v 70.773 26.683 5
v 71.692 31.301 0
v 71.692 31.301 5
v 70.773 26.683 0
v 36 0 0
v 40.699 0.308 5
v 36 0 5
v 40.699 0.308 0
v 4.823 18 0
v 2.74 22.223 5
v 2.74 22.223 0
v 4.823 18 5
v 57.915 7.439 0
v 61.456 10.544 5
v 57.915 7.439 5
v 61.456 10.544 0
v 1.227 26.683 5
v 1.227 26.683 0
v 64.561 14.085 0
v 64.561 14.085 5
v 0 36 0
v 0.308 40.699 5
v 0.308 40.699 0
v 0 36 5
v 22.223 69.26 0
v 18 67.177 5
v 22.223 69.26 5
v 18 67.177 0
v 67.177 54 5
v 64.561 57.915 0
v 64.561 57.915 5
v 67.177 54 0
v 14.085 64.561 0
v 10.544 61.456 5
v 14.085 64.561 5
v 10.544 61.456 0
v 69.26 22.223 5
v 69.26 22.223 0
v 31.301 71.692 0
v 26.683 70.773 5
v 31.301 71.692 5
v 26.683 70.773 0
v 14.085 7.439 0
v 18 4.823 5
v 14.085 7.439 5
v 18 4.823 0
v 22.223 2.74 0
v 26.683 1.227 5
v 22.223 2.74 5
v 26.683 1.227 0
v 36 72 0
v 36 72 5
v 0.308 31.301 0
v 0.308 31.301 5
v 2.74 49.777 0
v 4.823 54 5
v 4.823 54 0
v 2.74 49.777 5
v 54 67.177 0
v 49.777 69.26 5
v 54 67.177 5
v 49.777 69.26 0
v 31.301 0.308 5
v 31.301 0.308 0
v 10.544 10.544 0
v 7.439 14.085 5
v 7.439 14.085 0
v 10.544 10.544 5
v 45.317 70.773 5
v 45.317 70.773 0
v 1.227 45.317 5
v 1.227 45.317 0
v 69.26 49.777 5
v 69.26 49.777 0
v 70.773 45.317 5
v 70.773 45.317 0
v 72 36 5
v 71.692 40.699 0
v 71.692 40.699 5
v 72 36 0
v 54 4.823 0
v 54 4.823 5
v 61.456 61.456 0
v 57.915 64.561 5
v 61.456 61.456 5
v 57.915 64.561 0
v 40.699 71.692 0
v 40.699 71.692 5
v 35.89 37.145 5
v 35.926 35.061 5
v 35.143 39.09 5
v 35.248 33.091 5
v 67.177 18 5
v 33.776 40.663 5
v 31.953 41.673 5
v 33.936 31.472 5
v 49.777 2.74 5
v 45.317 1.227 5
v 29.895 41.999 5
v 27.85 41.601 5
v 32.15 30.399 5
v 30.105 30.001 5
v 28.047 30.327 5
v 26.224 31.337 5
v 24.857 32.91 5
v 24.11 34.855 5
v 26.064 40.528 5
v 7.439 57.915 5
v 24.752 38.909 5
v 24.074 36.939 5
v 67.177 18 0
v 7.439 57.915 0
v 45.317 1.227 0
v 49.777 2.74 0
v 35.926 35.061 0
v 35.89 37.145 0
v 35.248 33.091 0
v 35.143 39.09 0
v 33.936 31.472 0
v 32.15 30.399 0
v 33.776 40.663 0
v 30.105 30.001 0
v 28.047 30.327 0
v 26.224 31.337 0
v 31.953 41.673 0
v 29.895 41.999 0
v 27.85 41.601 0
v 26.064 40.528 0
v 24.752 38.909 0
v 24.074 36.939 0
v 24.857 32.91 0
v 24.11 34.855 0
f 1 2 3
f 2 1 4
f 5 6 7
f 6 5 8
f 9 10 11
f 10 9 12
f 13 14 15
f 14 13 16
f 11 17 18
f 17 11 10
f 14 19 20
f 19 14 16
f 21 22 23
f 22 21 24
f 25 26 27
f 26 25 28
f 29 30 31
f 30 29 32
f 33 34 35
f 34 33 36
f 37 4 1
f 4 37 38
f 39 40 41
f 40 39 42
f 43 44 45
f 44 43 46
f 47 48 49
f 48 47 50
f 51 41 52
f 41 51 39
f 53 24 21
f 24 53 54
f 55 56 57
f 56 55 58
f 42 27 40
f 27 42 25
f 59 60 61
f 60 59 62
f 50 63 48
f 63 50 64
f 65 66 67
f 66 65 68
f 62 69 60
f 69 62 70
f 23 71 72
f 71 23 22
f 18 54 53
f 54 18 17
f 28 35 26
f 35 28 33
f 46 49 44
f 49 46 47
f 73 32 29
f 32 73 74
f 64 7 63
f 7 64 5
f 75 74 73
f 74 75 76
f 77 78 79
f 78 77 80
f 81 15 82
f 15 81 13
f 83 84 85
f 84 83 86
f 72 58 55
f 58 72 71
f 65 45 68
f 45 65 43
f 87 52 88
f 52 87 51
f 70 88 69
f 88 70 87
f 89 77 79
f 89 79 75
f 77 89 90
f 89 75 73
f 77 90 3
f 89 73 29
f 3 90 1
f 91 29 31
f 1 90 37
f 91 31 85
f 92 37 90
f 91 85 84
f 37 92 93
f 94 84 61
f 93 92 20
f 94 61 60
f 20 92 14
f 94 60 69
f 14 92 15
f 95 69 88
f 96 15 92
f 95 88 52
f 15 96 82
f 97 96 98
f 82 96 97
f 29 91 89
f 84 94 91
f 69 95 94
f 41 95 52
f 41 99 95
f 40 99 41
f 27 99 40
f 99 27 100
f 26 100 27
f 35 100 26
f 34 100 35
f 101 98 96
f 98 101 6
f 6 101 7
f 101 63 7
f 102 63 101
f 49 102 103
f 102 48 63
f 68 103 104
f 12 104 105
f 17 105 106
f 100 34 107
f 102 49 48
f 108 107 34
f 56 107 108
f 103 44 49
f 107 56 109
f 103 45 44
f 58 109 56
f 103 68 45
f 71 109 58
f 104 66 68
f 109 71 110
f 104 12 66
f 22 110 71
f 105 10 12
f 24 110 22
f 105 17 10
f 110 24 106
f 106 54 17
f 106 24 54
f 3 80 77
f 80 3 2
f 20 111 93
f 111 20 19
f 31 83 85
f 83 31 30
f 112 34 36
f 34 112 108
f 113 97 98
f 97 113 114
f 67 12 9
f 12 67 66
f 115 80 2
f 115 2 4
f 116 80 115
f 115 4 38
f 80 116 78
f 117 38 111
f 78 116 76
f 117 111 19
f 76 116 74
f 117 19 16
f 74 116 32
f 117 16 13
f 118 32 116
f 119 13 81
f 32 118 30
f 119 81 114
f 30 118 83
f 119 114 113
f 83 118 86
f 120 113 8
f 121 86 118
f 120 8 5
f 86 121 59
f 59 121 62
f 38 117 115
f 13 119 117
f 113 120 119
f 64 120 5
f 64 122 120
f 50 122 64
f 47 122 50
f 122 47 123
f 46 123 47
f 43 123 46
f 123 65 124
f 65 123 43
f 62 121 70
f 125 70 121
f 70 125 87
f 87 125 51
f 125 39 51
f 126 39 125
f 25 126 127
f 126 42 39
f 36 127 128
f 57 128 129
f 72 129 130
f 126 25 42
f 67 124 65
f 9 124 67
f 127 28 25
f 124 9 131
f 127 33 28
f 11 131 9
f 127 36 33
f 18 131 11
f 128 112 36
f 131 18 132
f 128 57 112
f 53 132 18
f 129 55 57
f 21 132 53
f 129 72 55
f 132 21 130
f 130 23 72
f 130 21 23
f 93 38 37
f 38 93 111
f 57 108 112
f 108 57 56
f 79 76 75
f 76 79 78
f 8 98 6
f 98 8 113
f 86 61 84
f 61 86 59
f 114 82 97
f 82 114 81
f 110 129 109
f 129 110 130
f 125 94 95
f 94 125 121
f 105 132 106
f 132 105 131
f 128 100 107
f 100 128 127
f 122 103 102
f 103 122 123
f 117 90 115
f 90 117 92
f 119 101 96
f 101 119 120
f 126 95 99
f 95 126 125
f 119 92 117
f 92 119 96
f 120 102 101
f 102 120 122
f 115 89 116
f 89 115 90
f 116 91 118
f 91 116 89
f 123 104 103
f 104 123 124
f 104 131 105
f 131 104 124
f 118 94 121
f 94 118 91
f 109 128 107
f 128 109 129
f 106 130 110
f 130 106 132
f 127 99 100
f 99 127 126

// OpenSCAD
$fn = 32;

// ----------------------------------------------------------------------
// Cam plate: eccentric cam, base R36
// ----------------------------------------------------------------------

// --- parameters (mm) ---
base_r = 36;              // base circle radius
lobe_h = 10;              // cam lobe rise
bore_r = 6;               // shaft bore radius
plate_t = 5;              // plate thickness, Z (extrusion height)
ecc = 6;                  // disc eccentricity

profile = [[72, 36], [71.692, 40.699], [70.773, 45.317], [69.26, 49.777], [67.177, 54], [64.561, 57.915], [61.456, 61.456], [57.915, 64.561], [54, 67.177], [49.777, 69.26], [45.317, 70.773], [40.699, 71.692], [36, 72], [31.301, 71.692], [26.683, 70.773], [22.223, 69.26], [18, 67.177], [14.085, 64.561], [10.544, 61.456], [7.439, 57.915], [4.823, 54], [2.74, 49.777], [1.227, 45.317], [0.308, 40.699], [0, 36], [0.308, 31.301], [1.227, 26.683], [2.74, 22.223], [4.823, 18], [7.439, 14.085], [10.544, 10.544], [14.085, 7.439], [18, 4.823], [22.223, 2.74], [26.683, 1.227], [31.301, 0.308], [36, 0], [40.699, 0.308], [45.317, 1.227], [49.777, 2.74], [54, 4.823], [57.915, 7.439], [61.456, 10.544], [64.561, 14.085], [67.177, 18], [69.26, 22.223], [70.773, 26.683], [71.692, 31.301]];  // primary outline, 48 points, counter clockwise
void_1 = [[35.89, 37.145], [35.143, 39.09], [33.776, 40.663], [31.953, 41.673], [29.895, 41.999], [27.85, 41.601], [26.064, 40.528], [24.752, 38.909], [24.074, 36.939], [24.11, 34.855], [24.857, 32.91], [26.224, 31.337], [28.047, 30.327], [30.105, 30.001], [32.15, 30.399], [33.936, 31.472], [35.248, 33.091], [35.926, 35.061]];  // shaft bore, 18 points

// --- the one profile operation ---
difference() {
  linear_extrude(height = plate_t) polygon(points = profile);
  translate([0, 0, -1])
    linear_extrude(height = plate_t + 2) polygon(points = void_1);
}
